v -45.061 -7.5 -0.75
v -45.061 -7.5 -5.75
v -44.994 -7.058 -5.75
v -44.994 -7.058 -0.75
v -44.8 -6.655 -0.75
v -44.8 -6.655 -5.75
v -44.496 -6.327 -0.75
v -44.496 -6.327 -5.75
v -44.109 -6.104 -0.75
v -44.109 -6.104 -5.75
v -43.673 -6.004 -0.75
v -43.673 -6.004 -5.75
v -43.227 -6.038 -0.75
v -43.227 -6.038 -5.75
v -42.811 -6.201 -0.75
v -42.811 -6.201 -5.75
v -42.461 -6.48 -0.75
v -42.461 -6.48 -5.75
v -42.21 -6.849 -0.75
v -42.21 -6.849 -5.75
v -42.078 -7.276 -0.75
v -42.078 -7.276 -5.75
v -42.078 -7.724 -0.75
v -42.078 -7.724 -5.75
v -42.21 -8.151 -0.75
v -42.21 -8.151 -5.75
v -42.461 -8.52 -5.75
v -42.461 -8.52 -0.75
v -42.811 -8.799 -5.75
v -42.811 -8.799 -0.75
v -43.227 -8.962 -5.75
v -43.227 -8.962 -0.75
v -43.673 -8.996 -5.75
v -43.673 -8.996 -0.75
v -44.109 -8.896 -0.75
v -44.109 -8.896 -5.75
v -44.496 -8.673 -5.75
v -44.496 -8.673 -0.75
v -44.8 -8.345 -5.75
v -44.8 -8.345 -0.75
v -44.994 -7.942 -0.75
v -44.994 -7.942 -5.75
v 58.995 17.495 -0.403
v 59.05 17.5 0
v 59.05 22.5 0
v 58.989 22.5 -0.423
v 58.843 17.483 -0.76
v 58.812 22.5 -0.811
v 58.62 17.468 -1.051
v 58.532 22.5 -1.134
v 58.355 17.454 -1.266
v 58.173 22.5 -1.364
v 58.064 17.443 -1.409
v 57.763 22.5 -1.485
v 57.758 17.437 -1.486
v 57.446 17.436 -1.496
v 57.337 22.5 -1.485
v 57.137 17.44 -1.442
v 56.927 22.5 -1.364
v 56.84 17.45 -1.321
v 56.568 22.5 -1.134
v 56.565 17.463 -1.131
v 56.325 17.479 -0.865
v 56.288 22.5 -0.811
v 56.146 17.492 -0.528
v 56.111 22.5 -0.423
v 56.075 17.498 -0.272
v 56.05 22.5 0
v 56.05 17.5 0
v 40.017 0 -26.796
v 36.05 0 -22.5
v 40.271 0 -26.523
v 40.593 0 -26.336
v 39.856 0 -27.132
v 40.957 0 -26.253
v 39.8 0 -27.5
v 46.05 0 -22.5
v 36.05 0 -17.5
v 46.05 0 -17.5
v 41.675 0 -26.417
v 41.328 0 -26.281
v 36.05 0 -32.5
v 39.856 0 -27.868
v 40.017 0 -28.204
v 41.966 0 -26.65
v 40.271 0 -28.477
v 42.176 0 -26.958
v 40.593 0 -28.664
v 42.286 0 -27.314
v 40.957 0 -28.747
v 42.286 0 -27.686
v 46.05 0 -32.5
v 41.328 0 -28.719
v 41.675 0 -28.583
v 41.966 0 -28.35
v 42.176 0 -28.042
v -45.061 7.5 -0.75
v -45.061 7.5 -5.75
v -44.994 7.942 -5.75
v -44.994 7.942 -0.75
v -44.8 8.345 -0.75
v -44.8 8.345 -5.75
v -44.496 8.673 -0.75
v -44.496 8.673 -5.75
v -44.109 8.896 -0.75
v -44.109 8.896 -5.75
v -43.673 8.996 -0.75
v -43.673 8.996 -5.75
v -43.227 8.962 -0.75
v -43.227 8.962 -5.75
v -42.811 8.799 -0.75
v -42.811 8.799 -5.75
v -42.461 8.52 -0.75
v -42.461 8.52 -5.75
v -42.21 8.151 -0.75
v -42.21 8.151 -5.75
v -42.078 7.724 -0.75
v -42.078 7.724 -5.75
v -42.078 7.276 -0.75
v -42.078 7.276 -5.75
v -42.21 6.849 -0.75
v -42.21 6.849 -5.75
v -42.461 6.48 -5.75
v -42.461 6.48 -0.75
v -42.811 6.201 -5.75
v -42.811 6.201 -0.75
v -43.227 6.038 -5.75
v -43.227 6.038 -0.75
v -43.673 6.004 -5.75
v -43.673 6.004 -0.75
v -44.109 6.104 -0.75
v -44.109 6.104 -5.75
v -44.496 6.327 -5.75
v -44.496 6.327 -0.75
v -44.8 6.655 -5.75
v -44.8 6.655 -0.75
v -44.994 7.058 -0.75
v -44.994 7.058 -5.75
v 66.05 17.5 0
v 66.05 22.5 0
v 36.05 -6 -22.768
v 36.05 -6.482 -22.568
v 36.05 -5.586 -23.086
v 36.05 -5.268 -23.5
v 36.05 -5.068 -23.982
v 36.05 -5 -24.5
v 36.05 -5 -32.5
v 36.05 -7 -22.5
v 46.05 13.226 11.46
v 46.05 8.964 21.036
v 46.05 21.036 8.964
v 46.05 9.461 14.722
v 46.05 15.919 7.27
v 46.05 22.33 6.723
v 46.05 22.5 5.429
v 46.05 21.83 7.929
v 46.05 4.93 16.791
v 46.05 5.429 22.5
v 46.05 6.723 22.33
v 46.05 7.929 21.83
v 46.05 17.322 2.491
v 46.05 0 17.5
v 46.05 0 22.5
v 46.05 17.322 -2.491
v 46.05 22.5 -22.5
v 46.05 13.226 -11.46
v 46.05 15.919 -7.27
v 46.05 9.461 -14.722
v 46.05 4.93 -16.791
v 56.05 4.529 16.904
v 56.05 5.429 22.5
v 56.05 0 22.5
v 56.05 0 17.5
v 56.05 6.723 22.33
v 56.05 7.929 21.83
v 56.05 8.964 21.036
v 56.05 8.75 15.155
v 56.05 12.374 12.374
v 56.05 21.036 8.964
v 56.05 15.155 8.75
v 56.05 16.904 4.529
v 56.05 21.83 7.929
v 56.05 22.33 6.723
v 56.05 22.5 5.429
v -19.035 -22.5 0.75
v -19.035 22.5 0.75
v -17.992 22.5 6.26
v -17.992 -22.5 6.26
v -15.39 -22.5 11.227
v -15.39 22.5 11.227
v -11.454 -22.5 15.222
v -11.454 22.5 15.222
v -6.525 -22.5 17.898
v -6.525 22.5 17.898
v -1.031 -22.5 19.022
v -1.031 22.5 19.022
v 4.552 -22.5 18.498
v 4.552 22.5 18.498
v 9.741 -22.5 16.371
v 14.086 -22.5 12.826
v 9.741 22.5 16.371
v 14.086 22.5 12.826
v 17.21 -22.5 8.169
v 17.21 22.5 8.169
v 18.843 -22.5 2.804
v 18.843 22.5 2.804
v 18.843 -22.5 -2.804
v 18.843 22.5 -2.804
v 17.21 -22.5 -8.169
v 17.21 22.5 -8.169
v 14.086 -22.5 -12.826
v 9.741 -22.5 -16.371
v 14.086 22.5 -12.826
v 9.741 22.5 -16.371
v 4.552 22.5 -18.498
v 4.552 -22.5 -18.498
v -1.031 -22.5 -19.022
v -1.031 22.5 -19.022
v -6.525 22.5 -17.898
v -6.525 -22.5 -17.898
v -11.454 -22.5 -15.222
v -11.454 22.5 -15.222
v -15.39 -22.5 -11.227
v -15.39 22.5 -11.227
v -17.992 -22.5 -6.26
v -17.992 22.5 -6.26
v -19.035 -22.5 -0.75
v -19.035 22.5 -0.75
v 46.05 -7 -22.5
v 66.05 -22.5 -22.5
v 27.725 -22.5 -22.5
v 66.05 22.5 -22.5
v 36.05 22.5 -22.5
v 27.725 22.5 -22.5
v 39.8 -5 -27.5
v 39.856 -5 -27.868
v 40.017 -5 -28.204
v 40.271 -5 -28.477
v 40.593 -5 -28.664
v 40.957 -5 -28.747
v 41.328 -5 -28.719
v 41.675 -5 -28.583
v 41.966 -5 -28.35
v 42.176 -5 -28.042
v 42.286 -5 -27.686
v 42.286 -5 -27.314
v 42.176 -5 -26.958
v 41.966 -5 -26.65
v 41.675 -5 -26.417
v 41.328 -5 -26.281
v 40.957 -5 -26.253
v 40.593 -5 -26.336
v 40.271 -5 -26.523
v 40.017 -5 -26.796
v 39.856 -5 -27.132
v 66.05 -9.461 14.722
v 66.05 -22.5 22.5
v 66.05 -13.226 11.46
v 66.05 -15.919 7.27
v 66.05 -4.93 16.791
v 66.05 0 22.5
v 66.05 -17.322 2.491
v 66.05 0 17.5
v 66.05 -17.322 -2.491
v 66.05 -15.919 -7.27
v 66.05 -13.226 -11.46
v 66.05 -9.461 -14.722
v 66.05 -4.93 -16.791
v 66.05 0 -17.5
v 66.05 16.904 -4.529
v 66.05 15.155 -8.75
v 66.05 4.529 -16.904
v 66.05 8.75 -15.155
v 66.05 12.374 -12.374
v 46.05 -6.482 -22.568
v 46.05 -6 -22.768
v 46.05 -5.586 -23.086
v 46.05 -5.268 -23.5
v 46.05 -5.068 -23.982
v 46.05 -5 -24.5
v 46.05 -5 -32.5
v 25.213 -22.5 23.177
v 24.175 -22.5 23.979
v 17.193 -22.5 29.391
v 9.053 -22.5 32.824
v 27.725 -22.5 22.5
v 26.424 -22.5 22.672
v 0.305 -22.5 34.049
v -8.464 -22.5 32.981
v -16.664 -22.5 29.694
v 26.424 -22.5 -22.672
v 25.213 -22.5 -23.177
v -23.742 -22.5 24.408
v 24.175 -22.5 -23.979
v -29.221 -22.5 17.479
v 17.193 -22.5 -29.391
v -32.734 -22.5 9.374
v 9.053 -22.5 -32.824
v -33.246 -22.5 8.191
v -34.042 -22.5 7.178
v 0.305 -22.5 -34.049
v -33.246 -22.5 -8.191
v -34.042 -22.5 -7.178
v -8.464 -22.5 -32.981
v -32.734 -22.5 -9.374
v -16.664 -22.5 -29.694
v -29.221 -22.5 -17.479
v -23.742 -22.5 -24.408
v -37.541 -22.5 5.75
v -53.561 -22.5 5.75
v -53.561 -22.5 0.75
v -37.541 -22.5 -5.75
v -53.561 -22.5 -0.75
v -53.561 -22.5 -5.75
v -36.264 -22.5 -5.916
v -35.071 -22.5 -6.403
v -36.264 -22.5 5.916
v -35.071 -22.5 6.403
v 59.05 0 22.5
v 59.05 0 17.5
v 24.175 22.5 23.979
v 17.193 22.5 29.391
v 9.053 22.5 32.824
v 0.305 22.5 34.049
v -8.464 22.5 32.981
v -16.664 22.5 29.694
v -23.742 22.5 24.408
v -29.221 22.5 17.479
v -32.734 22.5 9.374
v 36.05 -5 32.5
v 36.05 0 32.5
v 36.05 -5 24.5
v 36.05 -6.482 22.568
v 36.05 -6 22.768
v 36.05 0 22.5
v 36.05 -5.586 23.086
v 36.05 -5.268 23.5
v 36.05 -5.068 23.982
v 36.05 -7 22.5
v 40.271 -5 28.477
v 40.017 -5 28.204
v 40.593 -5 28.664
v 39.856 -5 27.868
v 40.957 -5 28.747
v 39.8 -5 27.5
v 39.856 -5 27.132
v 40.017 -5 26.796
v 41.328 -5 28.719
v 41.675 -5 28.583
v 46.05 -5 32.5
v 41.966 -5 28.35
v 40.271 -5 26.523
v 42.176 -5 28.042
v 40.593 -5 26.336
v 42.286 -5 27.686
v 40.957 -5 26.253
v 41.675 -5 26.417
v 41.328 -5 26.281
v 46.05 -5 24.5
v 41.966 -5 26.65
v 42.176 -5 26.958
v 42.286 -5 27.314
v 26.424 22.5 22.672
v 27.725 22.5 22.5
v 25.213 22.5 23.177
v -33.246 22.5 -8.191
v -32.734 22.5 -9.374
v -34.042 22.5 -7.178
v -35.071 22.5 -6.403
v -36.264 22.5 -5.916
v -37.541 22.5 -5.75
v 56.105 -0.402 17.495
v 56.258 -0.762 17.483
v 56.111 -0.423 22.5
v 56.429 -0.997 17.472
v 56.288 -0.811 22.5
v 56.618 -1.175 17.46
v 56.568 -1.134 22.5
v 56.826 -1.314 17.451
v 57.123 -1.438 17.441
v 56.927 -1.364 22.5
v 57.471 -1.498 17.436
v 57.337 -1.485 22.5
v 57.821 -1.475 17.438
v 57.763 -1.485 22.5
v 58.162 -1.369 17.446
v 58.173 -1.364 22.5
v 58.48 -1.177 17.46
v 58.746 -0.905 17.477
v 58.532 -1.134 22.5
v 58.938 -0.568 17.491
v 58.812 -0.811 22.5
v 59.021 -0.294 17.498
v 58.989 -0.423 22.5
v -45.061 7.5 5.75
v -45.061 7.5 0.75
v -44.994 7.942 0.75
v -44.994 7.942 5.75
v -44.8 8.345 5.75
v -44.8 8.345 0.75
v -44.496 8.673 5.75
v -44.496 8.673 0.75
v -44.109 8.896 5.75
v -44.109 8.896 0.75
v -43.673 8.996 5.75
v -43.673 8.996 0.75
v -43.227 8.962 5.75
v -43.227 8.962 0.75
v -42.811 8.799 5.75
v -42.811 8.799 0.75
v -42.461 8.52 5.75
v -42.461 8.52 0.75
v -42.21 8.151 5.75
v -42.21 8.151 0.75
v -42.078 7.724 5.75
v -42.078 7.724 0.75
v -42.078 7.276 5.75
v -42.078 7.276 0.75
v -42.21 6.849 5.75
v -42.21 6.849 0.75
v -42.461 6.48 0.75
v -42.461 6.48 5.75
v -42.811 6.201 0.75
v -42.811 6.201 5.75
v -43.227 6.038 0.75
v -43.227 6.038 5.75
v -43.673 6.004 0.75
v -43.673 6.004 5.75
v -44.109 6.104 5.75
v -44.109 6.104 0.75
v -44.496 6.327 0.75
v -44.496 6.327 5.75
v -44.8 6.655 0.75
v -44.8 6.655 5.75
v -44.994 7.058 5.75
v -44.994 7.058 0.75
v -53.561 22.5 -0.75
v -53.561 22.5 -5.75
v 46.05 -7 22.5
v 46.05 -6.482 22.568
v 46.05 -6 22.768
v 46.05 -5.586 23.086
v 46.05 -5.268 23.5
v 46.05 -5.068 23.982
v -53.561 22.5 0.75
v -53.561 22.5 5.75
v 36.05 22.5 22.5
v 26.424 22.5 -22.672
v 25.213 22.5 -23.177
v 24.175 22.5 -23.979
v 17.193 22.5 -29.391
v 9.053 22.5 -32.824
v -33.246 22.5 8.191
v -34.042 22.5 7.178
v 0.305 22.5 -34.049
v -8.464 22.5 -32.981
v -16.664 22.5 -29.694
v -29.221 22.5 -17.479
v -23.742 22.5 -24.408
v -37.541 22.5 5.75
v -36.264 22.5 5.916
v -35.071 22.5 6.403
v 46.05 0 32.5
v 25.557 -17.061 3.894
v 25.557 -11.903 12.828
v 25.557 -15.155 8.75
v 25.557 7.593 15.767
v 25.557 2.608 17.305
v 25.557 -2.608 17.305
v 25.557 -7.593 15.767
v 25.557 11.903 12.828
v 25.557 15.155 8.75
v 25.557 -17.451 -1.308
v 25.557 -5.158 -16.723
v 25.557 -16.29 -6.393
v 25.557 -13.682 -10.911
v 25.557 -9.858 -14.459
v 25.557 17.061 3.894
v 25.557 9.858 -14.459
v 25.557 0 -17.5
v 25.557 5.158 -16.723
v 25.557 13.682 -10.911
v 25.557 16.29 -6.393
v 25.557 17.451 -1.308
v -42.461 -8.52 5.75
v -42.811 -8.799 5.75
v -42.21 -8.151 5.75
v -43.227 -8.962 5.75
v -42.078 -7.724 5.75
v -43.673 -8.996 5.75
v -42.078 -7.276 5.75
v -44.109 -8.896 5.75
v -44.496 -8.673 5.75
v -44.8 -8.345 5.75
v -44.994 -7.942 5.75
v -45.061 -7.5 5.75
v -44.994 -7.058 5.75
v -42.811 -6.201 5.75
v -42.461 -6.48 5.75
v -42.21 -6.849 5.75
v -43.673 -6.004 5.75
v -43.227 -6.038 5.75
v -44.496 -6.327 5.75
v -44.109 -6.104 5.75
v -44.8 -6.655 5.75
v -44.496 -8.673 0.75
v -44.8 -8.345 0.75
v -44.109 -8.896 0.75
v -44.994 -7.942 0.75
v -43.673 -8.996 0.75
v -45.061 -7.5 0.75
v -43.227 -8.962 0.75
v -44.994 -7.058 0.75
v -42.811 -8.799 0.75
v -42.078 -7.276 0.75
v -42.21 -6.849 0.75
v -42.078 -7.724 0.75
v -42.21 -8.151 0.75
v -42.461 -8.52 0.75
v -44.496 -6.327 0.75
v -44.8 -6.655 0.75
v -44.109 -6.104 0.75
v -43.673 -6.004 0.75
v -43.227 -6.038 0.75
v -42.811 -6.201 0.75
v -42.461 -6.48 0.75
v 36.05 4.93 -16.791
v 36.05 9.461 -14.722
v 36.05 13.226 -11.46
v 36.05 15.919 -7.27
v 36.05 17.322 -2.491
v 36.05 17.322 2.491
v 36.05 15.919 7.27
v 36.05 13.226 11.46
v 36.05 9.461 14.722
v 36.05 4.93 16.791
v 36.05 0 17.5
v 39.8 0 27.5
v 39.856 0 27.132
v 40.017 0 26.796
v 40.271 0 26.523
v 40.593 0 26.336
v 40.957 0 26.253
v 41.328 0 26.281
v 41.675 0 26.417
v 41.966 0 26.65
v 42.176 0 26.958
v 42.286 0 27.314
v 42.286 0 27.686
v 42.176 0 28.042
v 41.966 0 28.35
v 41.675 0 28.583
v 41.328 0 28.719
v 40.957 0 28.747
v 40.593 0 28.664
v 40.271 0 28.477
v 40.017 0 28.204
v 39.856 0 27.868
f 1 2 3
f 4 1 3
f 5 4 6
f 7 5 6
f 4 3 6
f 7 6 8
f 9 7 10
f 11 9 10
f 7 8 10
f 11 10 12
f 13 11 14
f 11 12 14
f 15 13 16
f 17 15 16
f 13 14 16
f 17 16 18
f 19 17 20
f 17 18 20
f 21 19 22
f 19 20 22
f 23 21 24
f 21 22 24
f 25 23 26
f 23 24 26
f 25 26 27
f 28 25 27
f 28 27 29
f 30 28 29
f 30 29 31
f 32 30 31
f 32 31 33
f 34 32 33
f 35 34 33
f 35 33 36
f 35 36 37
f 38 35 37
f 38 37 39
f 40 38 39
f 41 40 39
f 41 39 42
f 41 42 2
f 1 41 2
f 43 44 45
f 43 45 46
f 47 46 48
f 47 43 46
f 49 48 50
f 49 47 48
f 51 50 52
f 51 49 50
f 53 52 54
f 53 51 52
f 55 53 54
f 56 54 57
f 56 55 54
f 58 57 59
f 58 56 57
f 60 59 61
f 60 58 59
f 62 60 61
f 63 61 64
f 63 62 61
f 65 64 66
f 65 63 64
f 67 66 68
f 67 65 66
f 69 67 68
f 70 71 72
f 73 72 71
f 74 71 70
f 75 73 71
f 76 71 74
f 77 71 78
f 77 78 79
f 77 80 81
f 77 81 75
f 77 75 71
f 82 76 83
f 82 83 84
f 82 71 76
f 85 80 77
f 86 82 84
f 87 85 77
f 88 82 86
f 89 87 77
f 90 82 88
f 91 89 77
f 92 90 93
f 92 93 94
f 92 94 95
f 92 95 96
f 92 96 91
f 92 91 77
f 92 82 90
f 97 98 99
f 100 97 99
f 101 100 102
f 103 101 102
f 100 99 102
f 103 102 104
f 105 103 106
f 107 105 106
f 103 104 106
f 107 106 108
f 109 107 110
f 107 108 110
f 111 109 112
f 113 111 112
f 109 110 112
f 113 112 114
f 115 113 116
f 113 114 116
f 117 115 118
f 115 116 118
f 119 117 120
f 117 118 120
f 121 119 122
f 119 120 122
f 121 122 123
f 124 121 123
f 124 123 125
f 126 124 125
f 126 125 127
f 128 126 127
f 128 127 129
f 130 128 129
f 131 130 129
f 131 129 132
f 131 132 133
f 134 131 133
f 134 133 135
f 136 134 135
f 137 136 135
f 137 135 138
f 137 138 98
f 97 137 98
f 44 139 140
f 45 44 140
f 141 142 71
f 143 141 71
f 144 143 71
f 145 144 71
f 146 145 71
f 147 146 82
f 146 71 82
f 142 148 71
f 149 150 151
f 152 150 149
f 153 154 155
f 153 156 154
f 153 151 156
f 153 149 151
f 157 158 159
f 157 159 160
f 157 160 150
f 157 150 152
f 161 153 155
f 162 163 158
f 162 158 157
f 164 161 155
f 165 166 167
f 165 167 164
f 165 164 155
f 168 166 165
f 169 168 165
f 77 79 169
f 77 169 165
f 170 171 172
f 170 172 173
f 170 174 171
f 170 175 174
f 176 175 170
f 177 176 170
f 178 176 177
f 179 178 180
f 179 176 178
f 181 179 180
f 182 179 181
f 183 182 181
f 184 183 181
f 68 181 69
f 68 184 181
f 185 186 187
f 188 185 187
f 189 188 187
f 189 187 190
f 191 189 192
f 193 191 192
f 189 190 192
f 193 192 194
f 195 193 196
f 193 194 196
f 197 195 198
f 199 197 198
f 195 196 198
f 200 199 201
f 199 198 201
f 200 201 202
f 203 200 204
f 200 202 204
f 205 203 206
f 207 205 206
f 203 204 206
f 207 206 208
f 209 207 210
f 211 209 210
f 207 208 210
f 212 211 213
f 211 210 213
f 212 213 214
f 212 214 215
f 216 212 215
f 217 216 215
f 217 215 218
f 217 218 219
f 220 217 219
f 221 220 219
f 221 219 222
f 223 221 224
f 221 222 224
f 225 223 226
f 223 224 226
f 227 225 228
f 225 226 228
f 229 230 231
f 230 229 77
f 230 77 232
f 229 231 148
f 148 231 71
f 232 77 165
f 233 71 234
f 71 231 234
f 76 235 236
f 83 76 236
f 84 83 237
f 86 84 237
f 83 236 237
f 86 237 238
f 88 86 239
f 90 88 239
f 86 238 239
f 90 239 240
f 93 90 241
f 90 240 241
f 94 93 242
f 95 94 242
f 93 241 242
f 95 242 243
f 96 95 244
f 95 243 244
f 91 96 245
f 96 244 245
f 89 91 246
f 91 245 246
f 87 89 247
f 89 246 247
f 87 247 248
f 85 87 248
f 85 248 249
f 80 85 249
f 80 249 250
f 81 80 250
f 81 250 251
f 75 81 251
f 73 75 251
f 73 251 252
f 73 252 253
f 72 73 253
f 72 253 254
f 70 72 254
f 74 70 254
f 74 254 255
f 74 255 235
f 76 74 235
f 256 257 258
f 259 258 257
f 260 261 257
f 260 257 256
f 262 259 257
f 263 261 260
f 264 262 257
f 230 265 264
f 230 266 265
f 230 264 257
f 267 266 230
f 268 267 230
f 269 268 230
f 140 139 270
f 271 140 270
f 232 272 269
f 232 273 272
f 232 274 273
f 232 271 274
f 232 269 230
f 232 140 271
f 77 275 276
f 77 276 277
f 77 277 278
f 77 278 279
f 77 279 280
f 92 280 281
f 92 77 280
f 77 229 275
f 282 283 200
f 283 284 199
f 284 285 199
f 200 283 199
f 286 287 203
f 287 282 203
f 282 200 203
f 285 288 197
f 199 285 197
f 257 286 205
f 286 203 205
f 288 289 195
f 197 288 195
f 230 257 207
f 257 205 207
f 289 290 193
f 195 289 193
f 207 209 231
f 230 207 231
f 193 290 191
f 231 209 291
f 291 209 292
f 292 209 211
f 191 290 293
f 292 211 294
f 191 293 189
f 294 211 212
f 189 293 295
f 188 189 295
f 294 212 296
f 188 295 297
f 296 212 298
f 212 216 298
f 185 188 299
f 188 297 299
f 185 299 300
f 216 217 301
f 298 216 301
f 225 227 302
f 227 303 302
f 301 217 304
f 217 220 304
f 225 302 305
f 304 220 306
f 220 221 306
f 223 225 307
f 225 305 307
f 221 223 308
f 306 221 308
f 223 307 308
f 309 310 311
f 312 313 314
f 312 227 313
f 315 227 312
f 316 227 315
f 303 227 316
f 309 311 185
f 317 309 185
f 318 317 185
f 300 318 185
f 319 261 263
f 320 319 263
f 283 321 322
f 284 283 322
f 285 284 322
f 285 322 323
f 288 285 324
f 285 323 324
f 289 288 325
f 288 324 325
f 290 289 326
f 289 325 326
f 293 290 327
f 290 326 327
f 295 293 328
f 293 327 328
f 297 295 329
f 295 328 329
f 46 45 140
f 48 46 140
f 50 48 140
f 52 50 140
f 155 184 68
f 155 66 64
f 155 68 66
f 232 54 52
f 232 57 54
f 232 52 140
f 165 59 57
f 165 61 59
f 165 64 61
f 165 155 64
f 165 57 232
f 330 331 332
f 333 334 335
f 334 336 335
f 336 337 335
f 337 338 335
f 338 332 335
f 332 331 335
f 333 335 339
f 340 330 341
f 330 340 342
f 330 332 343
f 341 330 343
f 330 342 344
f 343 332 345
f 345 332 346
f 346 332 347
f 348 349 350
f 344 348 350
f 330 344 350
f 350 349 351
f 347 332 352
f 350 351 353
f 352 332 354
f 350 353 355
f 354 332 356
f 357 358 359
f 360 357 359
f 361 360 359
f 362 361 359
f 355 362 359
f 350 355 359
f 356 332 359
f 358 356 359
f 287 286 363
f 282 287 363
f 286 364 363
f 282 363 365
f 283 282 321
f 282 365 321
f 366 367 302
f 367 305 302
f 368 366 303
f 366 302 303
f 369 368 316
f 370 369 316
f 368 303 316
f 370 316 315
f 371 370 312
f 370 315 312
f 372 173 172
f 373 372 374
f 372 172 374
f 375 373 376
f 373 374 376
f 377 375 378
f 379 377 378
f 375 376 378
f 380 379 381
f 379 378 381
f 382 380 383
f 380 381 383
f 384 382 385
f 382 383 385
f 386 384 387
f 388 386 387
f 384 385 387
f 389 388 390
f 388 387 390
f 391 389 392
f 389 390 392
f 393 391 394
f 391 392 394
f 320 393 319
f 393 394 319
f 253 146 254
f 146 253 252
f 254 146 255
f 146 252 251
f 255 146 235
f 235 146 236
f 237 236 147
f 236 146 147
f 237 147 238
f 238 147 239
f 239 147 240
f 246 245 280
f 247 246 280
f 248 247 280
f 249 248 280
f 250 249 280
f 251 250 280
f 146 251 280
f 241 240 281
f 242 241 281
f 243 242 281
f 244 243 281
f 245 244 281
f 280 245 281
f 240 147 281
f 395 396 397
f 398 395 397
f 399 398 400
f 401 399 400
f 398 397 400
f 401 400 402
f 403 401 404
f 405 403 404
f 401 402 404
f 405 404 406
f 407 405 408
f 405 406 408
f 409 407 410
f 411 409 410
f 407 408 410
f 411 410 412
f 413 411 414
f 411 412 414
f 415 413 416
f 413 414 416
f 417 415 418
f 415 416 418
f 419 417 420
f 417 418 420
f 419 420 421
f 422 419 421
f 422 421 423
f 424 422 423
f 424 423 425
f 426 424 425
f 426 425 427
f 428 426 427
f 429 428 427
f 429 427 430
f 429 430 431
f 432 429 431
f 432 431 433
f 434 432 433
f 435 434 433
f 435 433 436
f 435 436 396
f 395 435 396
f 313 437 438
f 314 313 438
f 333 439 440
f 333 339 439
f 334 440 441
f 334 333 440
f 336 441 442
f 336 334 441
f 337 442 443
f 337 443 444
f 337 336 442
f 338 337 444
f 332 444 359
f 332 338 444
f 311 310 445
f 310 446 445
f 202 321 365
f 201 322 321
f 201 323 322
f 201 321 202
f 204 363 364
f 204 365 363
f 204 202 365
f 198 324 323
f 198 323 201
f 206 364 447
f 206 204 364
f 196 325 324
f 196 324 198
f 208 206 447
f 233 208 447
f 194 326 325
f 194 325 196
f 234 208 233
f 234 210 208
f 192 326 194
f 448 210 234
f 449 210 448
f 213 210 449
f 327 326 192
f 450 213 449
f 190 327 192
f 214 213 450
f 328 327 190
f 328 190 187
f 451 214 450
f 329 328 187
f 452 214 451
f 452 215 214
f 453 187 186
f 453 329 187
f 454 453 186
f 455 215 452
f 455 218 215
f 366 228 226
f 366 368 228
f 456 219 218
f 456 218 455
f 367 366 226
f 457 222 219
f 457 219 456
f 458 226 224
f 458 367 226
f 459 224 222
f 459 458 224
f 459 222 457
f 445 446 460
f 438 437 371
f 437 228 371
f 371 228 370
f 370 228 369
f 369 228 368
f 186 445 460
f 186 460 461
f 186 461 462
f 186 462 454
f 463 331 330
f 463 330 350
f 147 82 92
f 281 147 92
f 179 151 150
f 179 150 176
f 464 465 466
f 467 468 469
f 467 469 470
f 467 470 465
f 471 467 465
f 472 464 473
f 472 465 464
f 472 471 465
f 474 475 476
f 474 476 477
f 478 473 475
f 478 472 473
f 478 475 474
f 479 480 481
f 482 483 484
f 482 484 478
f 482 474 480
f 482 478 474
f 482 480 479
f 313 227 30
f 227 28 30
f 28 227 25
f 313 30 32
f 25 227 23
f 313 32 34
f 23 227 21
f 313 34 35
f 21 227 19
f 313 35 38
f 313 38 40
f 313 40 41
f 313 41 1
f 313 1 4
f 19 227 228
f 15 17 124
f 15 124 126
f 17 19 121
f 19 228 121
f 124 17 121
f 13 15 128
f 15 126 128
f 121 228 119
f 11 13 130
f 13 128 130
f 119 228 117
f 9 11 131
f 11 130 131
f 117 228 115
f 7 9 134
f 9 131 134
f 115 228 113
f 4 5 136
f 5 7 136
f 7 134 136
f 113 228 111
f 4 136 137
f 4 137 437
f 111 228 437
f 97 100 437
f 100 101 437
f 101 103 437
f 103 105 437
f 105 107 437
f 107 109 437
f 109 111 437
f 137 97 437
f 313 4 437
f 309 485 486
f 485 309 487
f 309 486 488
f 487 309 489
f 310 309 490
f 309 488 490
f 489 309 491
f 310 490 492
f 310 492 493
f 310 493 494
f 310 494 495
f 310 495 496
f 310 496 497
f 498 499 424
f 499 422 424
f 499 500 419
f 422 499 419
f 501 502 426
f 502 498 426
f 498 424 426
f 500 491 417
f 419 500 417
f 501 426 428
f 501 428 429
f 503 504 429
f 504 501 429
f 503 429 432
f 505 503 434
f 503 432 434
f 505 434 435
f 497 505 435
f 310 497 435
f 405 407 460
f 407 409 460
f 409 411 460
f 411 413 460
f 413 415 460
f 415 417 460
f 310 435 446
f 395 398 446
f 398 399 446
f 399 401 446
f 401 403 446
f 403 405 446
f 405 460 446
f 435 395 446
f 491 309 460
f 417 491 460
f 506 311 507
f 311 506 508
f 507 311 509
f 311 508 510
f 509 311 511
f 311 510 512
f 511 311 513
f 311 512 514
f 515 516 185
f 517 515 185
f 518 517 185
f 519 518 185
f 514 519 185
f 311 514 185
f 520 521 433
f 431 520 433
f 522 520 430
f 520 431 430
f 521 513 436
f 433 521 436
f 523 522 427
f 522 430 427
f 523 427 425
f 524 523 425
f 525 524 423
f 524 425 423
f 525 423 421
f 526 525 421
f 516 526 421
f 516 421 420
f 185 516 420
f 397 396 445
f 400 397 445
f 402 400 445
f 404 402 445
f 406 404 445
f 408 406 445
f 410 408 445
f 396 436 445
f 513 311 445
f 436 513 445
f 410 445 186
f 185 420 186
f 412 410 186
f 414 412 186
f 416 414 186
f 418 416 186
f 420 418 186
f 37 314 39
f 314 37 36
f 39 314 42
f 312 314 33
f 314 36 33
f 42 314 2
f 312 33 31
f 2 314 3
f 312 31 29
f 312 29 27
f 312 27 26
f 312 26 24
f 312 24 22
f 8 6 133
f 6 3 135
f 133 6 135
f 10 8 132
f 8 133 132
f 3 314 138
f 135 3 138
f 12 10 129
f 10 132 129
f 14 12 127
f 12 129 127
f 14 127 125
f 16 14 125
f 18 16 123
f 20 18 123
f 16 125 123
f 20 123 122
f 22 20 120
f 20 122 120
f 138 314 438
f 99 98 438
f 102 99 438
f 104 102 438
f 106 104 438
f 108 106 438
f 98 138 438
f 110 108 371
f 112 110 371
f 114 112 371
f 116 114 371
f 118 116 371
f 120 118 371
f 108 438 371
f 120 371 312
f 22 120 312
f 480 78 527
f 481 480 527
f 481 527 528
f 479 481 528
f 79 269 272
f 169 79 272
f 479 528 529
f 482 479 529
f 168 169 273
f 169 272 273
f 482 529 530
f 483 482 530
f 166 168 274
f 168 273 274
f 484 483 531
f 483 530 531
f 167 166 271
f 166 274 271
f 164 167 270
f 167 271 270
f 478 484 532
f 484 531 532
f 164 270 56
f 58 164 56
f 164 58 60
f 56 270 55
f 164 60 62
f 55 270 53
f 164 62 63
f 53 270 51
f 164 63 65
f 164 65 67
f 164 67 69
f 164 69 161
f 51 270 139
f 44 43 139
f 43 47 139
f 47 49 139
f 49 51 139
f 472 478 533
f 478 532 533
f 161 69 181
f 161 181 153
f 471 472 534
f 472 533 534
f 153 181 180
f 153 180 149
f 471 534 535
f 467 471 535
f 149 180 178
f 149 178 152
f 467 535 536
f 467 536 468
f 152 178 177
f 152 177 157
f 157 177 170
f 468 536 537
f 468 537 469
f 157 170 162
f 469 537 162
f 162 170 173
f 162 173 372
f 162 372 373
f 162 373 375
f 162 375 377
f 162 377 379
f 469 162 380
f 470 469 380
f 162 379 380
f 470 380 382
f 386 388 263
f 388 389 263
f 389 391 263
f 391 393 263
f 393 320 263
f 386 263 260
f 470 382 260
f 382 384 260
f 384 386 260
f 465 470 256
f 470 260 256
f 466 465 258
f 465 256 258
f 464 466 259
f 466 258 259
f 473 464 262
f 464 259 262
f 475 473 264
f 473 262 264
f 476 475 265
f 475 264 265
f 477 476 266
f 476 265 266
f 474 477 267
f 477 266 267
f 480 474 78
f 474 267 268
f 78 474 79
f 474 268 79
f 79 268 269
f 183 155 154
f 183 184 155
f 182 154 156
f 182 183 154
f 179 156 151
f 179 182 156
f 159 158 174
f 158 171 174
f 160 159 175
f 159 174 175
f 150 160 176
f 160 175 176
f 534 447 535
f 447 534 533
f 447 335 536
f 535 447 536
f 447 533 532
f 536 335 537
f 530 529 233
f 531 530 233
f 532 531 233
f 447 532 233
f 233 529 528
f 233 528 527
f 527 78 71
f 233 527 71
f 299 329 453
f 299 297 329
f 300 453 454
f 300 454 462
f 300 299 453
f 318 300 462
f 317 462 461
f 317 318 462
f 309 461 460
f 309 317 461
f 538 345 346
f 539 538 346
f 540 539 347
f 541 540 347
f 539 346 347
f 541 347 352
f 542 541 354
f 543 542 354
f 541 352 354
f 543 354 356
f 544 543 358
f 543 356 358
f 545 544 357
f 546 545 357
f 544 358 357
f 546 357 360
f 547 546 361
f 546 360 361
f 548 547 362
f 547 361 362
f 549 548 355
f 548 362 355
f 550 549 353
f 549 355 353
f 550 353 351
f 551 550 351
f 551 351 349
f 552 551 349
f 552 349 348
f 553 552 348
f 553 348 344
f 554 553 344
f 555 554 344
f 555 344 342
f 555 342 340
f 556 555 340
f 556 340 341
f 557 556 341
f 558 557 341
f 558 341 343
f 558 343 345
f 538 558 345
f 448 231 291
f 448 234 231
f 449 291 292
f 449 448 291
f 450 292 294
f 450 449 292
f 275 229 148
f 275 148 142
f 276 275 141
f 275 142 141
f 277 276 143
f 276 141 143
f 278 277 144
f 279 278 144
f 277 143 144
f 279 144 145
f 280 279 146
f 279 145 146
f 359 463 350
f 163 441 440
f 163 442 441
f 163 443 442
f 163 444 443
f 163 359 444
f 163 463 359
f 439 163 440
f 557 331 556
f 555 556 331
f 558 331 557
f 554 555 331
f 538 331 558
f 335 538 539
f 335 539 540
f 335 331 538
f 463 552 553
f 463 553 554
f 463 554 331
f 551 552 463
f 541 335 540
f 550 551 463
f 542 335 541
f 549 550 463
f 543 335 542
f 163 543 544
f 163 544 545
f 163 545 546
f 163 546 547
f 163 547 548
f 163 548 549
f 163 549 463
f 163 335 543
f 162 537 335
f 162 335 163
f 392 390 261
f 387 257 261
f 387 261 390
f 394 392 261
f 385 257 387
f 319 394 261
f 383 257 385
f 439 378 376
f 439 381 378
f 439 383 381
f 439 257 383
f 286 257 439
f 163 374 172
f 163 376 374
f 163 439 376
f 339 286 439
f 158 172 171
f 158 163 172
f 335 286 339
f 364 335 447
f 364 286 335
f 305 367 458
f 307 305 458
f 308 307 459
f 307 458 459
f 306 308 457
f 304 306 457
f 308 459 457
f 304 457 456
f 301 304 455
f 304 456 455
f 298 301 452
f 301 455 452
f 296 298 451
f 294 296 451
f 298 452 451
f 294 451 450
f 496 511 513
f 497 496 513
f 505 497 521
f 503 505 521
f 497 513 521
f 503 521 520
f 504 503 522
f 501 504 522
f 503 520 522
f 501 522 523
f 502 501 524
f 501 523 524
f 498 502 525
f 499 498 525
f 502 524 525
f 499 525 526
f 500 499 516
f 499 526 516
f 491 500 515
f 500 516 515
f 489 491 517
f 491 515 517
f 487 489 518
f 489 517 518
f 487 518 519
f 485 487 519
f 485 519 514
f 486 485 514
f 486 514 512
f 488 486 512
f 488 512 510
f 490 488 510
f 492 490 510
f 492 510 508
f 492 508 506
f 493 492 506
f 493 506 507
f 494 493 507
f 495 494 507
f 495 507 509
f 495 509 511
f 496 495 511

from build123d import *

# Parameters (mm, degrees)
BOSS_EXTRUDE1_DEPTH       = 22.5
F_3_0MM_DOWEL_HOLE1_D     = 3
BOSS_EXTRUDE2_START       = -8.493151603
BOSS_EXTRUDE2_OUTLINE_W   = 45
BOSS_EXTRUDE2_OUTLINE_H   = 45
BOSS_EXTRUDE2_DEPTH       = 40.493151603
SKETCH5_R                 = 17.5
CUT_EXTRUDE1_DEPTH        = 40.493152
SKETCH7_W                 = 10
SKETCH7_H                 = 45
CUT_EXTRUDE2_DEPTH        = 78.641837948
SKETCH8_W                 = 22.5
SKETCH8_H                 = 22.5
CUT_EXTRUDE3_DEPTH        = 10
CUT_EXTRUDE5_OUTLINE_W    = 1.5
CUT_EXTRUDE5_OUTLINE_H    = 5.064430618
CUT_EXTRUDE8_START        = 17.435595673
CUT_EXTRUDE8_DEPTH        = 5.064404327
SKETCH14_W                = 10
SKETCH14_H                = 15
BOSS_EXTRUDE3_DEPTH       = 5
M3X0_5_TAPPED_HOLE1_D     = 2.5
M3X0_5_TAPPED_HOLE1_DEPTH = 7.748924226
M3X0_5_TAPPED_HOLE1_TIP   = 0.751075774
CHAMFER1_SIZE             = 15
FILLET1_R                 = 2
FILLET2_R                 = 5
FILLET3_R                 = 5


# Read off the part's stored shape, not the designer's step: Boss-Extrude2, Cut-Extrude5, Cut-Extrude8
with BuildPart() as part:
    # Sketch3 → Boss-Extrude1 (new, symmetric)
    with BuildSketch(Plane(origin=(0, 0, 0), x_dir=(1, 0, 0), z_dir=(0, 1, 0))):
        with BuildLine():
            Line((-53.560989258, 0.75), (-53.560989258, 5.75))
            Line((-53.560989258, 5.75), (-33.560989258, 5.75))
            ThreePointArc((-33.560989258, 5.75), (34.05, 0), (-33.560989258, -5.75))
            Line((-33.560989258, -5.75), (-53.560989258, -5.75))
            Line((-53.560989258, -5.75), (-53.560989258, -0.75))
            Line((-53.560989258, -0.75), (-19.035230495, -0.75))
            ThreePointArc((-19.035230495, -0.75), (19.05, 0), (-19.035230495, 0.75))
            Line((-19.035230495, 0.75), (-53.560989258, 0.75))
        make_face()
    extrude(amount=BOSS_EXTRUDE1_DEPTH, both=True)

    # Ø3.0mm Dowel Hole1 (through all)
    with Locations(Plane.XY.offset(5.75)):
        with Locations((-43.560989258, 7.5), (-43.560989258, -7.5)):
            Hole(F_3_0MM_DOWEL_HOLE1_D / 2)

    # Boss-Extrude2 outline → Boss-Extrude2 (add)
    with BuildSketch(Plane(origin=(34.05, 0, 0), x_dir=(0, 0, -1), z_dir=(1, 0, 0)).offset(BOSS_EXTRUDE2_START)):
        Rectangle(BOSS_EXTRUDE2_OUTLINE_W, BOSS_EXTRUDE2_OUTLINE_H)
    extrude(amount=BOSS_EXTRUDE2_DEPTH)

    # Sketch5 → Cut-Extrude1 (cut)
    with BuildSketch(Plane(origin=(66.05, 0, 0), x_dir=(0, 0, -1), z_dir=(1, 0, 0))):
        Circle(SKETCH5_R)
    extrude(amount=-CUT_EXTRUDE1_DEPTH, mode=Mode.SUBTRACT)

    # Sketch7 → Cut-Extrude2 (cut, through all)
    with BuildSketch(Plane(origin=(0, 0, 0), x_dir=(1, 0, 0), z_dir=(0, 1, 0))):
        with Locations((41.05, 0)):
            Rectangle(SKETCH7_W, SKETCH7_H)
    extrude(amount=CUT_EXTRUDE2_DEPTH, mode=Mode.SUBTRACT)

    # Sketch8 → Cut-Extrude3 (cut)
    with BuildSketch(Plane(origin=(66.05, 0, 0), x_dir=(0, 0, -1), z_dir=(1, 0, 0))):
        with Locations((-11.25, 11.25)):
            Rectangle(SKETCH8_W, SKETCH8_H)
    extrude(amount=-CUT_EXTRUDE3_DEPTH, mode=Mode.SUBTRACT)

    # Cut-Extrude5 outline → Cut-Extrude5 (revolve, cut)
    with BuildSketch(Plane(origin=(57.55, 0, 0), x_dir=(1, 0, 0), z_dir=(0, -1, 0))):
        with Locations((0.75, 19.967784691)):
            Rectangle(CUT_EXTRUDE5_OUTLINE_W, CUT_EXTRUDE5_OUTLINE_H)
    revolve(axis=Axis((57.55, 0, 0), (0, 0, 1)), mode=Mode.SUBTRACT)

    # Cut-Extrude8 outline → Cut-Extrude8 (cut)
    with BuildSketch(Plane(origin=(0, 0, 0), x_dir=(1, 0, 0), z_dir=(0, 1, 0)).offset(CUT_EXTRUDE8_START)):
        with BuildLine():
            ThreePointArc((59.05, 0), (57.55, 1.5), (56.05, 0))
            Line((56.05, 0), (59.05, 0))
        make_face()
    extrude(amount=CUT_EXTRUDE8_DEPTH, mode=Mode.SUBTRACT)

    # Sketch14 → Boss-Extrude3 (add)
    with BuildSketch(Plane(origin=(0, 0, 0), x_dir=(1, 0, 0), z_dir=(0, 1, 0))):
        with Locations((41.05, -25)):
            Rectangle(SKETCH14_W, SKETCH14_H)
        with Locations((41.05, 25)):
            Rectangle(SKETCH14_W, SKETCH14_H)
    extrude(amount=-BOSS_EXTRUDE3_DEPTH)

    # M3x0.5 Tapped Hole1
    with Locations(Plane(origin=(0, 0, 0), x_dir=(1, 0, 0), z_dir=(0, 1, 0))):
        with Locations((41.05, 27.5), (41.05, -27.5)):
            Hole(M3X0_5_TAPPED_HOLE1_D / 2, depth=M3X0_5_TAPPED_HOLE1_DEPTH)
            with Locations((0, 0, -(M3X0_5_TAPPED_HOLE1_DEPTH + M3X0_5_TAPPED_HOLE1_TIP / 2))):  # 118° drill point
                Cone(0, M3X0_5_TAPPED_HOLE1_D / 2, M3X0_5_TAPPED_HOLE1_TIP, mode=Mode.SUBTRACT)

    # Chamfer1
    chamfer1_edges = [part.edges().sort_by_distance(p)[0] for p in [
        (51.05, 22.5, 22.5),
    ]]
    chamfer(chamfer1_edges, length=CHAMFER1_SIZE)

    # Fillet1
    fillet1_edges = [part.edges().sort_by_distance(p)[0] for p in [
        (41.05, -5, 22.5),
        (41.05, -5, -22.5),
    ]]
    fillet(fillet1_edges, radius=FILLET1_R)

    # Fillet2
    fillet2_edges = [part.edges().sort_by_distance(p)[0] for p in [
        (51.05, 22.5, 7.5),
        (51.05, 7.5, 22.5),
    ]]
    fillet(fillet2_edges, radius=FILLET2_R)

    # Fillet3
    fillet3_edges = [part.edges().sort_by_distance(p)[0] for p in [
        (-33.560989258, 0, -5.75),
        (-33.560989258, 0, 5.75),
        (25.556848397, 0, -22.5),
        (25.556848397, 0, 22.5),
    ]]
    fillet(fillet3_edges, radius=FILLET3_R)


solid = part.part
